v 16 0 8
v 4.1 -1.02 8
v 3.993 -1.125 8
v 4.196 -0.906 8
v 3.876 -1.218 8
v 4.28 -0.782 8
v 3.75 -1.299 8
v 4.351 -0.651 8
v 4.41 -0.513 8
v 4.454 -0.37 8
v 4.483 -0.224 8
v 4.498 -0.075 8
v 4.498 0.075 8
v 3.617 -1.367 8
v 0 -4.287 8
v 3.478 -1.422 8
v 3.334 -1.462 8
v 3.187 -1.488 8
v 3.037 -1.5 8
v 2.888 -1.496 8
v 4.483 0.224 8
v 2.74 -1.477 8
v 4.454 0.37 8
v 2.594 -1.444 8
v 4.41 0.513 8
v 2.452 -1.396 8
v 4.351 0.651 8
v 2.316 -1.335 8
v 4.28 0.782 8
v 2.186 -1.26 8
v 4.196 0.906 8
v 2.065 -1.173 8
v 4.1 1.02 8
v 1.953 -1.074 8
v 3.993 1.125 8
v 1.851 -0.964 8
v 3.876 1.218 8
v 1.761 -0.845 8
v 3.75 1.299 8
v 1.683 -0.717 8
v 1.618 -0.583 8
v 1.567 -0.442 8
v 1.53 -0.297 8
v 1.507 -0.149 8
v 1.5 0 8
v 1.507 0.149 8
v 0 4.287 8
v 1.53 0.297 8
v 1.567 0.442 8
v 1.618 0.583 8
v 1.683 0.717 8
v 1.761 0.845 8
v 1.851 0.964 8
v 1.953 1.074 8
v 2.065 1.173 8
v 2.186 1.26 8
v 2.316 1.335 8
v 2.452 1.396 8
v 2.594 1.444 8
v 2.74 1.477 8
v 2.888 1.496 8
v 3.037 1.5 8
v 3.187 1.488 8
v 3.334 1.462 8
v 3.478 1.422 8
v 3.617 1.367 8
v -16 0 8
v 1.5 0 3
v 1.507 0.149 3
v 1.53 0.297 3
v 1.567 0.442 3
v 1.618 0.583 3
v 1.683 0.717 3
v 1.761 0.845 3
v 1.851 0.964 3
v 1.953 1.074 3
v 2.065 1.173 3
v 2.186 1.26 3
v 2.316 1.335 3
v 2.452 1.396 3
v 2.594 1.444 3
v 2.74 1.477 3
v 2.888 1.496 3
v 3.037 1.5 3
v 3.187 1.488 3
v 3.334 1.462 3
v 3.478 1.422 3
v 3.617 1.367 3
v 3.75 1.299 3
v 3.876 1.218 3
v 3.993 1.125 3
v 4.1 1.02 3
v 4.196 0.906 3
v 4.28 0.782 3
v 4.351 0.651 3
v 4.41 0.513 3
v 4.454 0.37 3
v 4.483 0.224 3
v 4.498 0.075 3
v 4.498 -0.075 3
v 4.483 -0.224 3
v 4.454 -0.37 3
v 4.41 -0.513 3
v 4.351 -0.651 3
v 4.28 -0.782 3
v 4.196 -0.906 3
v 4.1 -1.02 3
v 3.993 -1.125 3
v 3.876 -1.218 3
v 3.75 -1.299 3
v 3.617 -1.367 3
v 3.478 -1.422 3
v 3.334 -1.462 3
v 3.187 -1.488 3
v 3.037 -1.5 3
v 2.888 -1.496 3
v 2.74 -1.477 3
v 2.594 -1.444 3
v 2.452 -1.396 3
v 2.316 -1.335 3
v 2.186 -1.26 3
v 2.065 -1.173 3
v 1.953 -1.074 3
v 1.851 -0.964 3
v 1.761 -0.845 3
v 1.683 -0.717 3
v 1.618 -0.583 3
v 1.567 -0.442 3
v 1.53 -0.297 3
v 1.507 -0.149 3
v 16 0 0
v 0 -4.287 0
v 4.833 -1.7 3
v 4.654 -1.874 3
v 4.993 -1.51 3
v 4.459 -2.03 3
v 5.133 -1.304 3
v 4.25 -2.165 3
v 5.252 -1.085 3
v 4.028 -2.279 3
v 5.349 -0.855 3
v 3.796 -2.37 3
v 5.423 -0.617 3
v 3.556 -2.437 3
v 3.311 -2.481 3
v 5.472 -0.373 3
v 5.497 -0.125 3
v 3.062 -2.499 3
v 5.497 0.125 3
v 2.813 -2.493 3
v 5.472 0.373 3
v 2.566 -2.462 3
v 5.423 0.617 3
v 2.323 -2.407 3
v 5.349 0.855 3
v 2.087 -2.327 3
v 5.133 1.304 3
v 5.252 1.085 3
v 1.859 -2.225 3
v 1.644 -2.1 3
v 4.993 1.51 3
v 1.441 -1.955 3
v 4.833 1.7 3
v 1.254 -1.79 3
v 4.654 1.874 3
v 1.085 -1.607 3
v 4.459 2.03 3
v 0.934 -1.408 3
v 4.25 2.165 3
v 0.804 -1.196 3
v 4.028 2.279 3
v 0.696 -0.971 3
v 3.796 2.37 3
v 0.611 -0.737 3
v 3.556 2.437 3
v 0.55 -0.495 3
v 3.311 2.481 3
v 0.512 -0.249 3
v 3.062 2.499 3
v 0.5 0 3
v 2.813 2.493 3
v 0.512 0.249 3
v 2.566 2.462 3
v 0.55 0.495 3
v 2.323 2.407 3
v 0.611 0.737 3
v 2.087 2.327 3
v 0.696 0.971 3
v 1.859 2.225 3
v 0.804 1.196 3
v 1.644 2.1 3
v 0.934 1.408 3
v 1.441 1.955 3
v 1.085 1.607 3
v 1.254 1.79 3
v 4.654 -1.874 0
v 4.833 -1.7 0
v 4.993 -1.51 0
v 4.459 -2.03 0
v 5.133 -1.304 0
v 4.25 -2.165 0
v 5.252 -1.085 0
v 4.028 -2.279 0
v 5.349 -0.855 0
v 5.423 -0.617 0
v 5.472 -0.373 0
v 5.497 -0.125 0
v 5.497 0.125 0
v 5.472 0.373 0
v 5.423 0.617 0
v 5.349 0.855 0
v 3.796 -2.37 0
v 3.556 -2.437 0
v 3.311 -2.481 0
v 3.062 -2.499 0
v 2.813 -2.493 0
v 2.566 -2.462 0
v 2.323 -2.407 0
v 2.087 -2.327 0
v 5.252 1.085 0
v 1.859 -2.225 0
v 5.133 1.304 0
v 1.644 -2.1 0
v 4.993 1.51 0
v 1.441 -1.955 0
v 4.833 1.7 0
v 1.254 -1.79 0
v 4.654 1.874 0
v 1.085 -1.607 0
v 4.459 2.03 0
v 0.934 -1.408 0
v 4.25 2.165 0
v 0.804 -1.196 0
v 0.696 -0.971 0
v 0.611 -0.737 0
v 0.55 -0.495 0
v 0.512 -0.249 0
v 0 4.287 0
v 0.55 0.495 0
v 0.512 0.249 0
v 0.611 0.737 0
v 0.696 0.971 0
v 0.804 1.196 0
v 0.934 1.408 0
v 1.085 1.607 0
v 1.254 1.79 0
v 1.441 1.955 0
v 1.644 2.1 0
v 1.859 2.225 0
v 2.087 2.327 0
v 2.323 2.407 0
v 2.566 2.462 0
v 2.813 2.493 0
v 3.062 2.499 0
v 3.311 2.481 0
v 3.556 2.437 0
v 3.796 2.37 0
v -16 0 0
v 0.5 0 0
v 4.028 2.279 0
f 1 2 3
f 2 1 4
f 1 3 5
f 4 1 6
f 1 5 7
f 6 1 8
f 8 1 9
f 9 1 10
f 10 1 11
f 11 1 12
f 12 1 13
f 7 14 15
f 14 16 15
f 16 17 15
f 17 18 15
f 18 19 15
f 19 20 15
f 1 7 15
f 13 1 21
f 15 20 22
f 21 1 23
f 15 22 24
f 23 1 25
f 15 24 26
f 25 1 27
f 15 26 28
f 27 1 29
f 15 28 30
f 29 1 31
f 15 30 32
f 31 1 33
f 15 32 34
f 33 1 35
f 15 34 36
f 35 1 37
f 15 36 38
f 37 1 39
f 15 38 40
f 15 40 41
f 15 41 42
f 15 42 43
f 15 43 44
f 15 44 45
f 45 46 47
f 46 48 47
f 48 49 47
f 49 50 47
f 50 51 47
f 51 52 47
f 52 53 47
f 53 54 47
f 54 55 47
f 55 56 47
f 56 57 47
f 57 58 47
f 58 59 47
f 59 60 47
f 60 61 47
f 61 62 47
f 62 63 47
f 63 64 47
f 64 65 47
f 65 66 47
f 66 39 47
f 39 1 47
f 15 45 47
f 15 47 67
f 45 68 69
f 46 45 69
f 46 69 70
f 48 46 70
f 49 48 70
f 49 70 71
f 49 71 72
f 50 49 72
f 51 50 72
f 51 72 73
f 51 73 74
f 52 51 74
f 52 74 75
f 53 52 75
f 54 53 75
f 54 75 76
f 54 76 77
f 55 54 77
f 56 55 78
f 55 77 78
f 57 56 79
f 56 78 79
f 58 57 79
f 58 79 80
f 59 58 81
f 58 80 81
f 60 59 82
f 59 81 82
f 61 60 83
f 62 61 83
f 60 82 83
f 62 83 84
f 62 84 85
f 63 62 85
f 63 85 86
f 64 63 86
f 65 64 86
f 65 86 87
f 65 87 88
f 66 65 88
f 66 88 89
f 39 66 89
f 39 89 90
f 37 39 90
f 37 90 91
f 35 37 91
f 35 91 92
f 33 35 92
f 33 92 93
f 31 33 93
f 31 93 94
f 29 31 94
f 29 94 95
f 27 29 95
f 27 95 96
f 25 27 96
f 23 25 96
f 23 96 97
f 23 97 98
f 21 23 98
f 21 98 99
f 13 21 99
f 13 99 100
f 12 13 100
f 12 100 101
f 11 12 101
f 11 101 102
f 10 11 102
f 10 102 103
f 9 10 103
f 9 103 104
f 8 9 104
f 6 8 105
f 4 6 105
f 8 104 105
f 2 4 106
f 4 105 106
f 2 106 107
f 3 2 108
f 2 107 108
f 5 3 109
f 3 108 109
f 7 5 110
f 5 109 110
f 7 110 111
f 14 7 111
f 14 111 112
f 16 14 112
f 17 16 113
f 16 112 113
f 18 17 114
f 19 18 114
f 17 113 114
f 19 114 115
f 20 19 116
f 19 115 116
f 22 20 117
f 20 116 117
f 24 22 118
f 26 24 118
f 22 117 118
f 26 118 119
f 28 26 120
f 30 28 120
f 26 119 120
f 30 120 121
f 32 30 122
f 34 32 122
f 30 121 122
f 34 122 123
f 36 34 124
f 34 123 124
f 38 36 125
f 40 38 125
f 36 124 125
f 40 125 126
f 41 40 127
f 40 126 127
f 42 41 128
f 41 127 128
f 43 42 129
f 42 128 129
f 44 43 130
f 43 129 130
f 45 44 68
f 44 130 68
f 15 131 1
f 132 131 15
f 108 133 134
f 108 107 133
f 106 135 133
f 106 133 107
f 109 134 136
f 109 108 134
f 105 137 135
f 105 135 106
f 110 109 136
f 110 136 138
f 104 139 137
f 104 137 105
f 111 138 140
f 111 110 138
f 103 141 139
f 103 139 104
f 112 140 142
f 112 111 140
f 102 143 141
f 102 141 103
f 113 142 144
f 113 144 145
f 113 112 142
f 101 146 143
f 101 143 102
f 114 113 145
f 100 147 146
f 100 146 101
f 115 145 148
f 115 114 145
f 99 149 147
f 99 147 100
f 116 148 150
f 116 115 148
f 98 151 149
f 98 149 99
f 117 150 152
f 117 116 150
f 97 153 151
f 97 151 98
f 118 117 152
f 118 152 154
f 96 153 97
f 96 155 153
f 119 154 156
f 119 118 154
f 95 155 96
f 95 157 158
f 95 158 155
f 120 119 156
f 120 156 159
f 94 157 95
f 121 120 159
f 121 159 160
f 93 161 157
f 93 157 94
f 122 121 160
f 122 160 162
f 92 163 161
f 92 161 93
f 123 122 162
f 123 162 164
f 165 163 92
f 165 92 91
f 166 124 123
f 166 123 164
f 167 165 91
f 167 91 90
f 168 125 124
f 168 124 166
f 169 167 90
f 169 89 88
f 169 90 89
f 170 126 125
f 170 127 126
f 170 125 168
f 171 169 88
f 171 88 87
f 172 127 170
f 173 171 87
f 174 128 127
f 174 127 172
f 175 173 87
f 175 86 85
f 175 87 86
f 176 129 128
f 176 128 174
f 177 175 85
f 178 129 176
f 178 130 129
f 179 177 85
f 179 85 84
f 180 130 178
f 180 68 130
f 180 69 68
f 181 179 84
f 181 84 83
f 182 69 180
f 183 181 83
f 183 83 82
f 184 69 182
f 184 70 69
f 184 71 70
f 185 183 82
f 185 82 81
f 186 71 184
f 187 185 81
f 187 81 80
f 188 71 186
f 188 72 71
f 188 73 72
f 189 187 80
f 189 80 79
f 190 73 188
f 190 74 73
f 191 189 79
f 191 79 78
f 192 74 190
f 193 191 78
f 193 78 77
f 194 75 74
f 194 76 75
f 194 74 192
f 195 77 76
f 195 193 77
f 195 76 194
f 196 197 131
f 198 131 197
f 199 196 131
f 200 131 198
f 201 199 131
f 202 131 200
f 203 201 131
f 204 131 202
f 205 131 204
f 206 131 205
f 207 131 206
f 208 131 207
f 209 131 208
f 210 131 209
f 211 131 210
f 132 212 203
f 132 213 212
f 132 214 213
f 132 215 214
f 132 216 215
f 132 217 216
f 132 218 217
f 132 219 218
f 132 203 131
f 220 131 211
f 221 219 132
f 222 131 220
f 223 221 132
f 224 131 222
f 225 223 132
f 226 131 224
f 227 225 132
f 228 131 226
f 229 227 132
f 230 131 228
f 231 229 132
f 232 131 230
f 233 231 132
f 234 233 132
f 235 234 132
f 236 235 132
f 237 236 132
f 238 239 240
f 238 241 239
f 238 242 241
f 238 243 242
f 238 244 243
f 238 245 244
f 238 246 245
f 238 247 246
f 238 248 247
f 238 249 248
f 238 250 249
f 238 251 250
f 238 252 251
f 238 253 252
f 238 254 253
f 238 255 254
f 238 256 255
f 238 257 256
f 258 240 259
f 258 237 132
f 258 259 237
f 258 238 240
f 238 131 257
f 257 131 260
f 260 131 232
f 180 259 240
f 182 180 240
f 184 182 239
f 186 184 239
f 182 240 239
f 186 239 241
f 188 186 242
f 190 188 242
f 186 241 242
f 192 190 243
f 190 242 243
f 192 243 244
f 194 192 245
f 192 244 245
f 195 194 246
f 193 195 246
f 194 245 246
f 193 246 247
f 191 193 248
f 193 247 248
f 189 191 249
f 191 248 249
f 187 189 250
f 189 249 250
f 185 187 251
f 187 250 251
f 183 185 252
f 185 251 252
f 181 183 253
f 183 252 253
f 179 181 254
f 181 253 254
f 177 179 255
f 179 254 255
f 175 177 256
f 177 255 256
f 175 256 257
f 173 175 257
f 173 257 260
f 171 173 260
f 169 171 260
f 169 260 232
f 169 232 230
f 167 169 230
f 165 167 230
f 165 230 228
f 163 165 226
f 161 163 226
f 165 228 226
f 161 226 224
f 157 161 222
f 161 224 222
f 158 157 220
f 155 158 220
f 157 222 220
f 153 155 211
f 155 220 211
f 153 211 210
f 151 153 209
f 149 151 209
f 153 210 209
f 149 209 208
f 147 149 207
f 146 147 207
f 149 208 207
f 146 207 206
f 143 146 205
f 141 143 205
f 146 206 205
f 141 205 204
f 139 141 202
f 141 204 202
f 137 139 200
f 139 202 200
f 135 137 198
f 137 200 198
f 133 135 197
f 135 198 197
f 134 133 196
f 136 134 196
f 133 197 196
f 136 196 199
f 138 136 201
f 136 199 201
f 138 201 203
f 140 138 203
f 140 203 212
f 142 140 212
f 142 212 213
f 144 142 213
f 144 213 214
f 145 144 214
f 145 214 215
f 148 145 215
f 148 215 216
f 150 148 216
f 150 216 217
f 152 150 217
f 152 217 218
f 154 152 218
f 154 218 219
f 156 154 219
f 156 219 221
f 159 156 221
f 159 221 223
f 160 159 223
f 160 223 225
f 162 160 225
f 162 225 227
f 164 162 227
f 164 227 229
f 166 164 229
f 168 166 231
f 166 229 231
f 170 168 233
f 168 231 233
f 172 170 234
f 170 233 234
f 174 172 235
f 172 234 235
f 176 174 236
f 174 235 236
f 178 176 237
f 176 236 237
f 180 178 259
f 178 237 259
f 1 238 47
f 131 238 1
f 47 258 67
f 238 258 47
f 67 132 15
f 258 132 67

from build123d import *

# Parameters (mm, degrees)
EXTRUDE_1_DEPTH     = 8
SKETCH_2_R          = 1.5
CUT_EXTRUDE_1_DEPTH = 9
SKETCH_3_R          = 2.5
CUT_EXTRUDE_2_DEPTH = 3


with BuildPart() as part:
    # 草图1 → 凸台-拉伸1 (new body)
    with BuildSketch(Plane.XY):
        Polygon((-16, 0), (0, 4.287187079), (16, 0), (0, -4.287187079), align=None)
    extrude(amount=EXTRUDE_1_DEPTH)

    # 草图2 → 切除-拉伸1 (cut, through all)
    with BuildSketch(Plane(origin=(0, 0, 0), x_dir=(-1, 0, 0), z_dir=(0, 0, -1))):
        with Locations((-3, 0)):
            Circle(SKETCH_2_R)
    extrude(amount=-CUT_EXTRUDE_1_DEPTH, mode=Mode.SUBTRACT)

    # 草图3 → 切除-拉伸2 (cut)
    with BuildSketch(Plane(origin=(0, 0, 0), x_dir=(-1, 0, 0), z_dir=(0, 0, -1))):
        with Locations((-3, 0)):
            Circle(SKETCH_3_R)
    extrude(amount=-CUT_EXTRUDE_2_DEPTH, mode=Mode.SUBTRACT)


solid = part.part
